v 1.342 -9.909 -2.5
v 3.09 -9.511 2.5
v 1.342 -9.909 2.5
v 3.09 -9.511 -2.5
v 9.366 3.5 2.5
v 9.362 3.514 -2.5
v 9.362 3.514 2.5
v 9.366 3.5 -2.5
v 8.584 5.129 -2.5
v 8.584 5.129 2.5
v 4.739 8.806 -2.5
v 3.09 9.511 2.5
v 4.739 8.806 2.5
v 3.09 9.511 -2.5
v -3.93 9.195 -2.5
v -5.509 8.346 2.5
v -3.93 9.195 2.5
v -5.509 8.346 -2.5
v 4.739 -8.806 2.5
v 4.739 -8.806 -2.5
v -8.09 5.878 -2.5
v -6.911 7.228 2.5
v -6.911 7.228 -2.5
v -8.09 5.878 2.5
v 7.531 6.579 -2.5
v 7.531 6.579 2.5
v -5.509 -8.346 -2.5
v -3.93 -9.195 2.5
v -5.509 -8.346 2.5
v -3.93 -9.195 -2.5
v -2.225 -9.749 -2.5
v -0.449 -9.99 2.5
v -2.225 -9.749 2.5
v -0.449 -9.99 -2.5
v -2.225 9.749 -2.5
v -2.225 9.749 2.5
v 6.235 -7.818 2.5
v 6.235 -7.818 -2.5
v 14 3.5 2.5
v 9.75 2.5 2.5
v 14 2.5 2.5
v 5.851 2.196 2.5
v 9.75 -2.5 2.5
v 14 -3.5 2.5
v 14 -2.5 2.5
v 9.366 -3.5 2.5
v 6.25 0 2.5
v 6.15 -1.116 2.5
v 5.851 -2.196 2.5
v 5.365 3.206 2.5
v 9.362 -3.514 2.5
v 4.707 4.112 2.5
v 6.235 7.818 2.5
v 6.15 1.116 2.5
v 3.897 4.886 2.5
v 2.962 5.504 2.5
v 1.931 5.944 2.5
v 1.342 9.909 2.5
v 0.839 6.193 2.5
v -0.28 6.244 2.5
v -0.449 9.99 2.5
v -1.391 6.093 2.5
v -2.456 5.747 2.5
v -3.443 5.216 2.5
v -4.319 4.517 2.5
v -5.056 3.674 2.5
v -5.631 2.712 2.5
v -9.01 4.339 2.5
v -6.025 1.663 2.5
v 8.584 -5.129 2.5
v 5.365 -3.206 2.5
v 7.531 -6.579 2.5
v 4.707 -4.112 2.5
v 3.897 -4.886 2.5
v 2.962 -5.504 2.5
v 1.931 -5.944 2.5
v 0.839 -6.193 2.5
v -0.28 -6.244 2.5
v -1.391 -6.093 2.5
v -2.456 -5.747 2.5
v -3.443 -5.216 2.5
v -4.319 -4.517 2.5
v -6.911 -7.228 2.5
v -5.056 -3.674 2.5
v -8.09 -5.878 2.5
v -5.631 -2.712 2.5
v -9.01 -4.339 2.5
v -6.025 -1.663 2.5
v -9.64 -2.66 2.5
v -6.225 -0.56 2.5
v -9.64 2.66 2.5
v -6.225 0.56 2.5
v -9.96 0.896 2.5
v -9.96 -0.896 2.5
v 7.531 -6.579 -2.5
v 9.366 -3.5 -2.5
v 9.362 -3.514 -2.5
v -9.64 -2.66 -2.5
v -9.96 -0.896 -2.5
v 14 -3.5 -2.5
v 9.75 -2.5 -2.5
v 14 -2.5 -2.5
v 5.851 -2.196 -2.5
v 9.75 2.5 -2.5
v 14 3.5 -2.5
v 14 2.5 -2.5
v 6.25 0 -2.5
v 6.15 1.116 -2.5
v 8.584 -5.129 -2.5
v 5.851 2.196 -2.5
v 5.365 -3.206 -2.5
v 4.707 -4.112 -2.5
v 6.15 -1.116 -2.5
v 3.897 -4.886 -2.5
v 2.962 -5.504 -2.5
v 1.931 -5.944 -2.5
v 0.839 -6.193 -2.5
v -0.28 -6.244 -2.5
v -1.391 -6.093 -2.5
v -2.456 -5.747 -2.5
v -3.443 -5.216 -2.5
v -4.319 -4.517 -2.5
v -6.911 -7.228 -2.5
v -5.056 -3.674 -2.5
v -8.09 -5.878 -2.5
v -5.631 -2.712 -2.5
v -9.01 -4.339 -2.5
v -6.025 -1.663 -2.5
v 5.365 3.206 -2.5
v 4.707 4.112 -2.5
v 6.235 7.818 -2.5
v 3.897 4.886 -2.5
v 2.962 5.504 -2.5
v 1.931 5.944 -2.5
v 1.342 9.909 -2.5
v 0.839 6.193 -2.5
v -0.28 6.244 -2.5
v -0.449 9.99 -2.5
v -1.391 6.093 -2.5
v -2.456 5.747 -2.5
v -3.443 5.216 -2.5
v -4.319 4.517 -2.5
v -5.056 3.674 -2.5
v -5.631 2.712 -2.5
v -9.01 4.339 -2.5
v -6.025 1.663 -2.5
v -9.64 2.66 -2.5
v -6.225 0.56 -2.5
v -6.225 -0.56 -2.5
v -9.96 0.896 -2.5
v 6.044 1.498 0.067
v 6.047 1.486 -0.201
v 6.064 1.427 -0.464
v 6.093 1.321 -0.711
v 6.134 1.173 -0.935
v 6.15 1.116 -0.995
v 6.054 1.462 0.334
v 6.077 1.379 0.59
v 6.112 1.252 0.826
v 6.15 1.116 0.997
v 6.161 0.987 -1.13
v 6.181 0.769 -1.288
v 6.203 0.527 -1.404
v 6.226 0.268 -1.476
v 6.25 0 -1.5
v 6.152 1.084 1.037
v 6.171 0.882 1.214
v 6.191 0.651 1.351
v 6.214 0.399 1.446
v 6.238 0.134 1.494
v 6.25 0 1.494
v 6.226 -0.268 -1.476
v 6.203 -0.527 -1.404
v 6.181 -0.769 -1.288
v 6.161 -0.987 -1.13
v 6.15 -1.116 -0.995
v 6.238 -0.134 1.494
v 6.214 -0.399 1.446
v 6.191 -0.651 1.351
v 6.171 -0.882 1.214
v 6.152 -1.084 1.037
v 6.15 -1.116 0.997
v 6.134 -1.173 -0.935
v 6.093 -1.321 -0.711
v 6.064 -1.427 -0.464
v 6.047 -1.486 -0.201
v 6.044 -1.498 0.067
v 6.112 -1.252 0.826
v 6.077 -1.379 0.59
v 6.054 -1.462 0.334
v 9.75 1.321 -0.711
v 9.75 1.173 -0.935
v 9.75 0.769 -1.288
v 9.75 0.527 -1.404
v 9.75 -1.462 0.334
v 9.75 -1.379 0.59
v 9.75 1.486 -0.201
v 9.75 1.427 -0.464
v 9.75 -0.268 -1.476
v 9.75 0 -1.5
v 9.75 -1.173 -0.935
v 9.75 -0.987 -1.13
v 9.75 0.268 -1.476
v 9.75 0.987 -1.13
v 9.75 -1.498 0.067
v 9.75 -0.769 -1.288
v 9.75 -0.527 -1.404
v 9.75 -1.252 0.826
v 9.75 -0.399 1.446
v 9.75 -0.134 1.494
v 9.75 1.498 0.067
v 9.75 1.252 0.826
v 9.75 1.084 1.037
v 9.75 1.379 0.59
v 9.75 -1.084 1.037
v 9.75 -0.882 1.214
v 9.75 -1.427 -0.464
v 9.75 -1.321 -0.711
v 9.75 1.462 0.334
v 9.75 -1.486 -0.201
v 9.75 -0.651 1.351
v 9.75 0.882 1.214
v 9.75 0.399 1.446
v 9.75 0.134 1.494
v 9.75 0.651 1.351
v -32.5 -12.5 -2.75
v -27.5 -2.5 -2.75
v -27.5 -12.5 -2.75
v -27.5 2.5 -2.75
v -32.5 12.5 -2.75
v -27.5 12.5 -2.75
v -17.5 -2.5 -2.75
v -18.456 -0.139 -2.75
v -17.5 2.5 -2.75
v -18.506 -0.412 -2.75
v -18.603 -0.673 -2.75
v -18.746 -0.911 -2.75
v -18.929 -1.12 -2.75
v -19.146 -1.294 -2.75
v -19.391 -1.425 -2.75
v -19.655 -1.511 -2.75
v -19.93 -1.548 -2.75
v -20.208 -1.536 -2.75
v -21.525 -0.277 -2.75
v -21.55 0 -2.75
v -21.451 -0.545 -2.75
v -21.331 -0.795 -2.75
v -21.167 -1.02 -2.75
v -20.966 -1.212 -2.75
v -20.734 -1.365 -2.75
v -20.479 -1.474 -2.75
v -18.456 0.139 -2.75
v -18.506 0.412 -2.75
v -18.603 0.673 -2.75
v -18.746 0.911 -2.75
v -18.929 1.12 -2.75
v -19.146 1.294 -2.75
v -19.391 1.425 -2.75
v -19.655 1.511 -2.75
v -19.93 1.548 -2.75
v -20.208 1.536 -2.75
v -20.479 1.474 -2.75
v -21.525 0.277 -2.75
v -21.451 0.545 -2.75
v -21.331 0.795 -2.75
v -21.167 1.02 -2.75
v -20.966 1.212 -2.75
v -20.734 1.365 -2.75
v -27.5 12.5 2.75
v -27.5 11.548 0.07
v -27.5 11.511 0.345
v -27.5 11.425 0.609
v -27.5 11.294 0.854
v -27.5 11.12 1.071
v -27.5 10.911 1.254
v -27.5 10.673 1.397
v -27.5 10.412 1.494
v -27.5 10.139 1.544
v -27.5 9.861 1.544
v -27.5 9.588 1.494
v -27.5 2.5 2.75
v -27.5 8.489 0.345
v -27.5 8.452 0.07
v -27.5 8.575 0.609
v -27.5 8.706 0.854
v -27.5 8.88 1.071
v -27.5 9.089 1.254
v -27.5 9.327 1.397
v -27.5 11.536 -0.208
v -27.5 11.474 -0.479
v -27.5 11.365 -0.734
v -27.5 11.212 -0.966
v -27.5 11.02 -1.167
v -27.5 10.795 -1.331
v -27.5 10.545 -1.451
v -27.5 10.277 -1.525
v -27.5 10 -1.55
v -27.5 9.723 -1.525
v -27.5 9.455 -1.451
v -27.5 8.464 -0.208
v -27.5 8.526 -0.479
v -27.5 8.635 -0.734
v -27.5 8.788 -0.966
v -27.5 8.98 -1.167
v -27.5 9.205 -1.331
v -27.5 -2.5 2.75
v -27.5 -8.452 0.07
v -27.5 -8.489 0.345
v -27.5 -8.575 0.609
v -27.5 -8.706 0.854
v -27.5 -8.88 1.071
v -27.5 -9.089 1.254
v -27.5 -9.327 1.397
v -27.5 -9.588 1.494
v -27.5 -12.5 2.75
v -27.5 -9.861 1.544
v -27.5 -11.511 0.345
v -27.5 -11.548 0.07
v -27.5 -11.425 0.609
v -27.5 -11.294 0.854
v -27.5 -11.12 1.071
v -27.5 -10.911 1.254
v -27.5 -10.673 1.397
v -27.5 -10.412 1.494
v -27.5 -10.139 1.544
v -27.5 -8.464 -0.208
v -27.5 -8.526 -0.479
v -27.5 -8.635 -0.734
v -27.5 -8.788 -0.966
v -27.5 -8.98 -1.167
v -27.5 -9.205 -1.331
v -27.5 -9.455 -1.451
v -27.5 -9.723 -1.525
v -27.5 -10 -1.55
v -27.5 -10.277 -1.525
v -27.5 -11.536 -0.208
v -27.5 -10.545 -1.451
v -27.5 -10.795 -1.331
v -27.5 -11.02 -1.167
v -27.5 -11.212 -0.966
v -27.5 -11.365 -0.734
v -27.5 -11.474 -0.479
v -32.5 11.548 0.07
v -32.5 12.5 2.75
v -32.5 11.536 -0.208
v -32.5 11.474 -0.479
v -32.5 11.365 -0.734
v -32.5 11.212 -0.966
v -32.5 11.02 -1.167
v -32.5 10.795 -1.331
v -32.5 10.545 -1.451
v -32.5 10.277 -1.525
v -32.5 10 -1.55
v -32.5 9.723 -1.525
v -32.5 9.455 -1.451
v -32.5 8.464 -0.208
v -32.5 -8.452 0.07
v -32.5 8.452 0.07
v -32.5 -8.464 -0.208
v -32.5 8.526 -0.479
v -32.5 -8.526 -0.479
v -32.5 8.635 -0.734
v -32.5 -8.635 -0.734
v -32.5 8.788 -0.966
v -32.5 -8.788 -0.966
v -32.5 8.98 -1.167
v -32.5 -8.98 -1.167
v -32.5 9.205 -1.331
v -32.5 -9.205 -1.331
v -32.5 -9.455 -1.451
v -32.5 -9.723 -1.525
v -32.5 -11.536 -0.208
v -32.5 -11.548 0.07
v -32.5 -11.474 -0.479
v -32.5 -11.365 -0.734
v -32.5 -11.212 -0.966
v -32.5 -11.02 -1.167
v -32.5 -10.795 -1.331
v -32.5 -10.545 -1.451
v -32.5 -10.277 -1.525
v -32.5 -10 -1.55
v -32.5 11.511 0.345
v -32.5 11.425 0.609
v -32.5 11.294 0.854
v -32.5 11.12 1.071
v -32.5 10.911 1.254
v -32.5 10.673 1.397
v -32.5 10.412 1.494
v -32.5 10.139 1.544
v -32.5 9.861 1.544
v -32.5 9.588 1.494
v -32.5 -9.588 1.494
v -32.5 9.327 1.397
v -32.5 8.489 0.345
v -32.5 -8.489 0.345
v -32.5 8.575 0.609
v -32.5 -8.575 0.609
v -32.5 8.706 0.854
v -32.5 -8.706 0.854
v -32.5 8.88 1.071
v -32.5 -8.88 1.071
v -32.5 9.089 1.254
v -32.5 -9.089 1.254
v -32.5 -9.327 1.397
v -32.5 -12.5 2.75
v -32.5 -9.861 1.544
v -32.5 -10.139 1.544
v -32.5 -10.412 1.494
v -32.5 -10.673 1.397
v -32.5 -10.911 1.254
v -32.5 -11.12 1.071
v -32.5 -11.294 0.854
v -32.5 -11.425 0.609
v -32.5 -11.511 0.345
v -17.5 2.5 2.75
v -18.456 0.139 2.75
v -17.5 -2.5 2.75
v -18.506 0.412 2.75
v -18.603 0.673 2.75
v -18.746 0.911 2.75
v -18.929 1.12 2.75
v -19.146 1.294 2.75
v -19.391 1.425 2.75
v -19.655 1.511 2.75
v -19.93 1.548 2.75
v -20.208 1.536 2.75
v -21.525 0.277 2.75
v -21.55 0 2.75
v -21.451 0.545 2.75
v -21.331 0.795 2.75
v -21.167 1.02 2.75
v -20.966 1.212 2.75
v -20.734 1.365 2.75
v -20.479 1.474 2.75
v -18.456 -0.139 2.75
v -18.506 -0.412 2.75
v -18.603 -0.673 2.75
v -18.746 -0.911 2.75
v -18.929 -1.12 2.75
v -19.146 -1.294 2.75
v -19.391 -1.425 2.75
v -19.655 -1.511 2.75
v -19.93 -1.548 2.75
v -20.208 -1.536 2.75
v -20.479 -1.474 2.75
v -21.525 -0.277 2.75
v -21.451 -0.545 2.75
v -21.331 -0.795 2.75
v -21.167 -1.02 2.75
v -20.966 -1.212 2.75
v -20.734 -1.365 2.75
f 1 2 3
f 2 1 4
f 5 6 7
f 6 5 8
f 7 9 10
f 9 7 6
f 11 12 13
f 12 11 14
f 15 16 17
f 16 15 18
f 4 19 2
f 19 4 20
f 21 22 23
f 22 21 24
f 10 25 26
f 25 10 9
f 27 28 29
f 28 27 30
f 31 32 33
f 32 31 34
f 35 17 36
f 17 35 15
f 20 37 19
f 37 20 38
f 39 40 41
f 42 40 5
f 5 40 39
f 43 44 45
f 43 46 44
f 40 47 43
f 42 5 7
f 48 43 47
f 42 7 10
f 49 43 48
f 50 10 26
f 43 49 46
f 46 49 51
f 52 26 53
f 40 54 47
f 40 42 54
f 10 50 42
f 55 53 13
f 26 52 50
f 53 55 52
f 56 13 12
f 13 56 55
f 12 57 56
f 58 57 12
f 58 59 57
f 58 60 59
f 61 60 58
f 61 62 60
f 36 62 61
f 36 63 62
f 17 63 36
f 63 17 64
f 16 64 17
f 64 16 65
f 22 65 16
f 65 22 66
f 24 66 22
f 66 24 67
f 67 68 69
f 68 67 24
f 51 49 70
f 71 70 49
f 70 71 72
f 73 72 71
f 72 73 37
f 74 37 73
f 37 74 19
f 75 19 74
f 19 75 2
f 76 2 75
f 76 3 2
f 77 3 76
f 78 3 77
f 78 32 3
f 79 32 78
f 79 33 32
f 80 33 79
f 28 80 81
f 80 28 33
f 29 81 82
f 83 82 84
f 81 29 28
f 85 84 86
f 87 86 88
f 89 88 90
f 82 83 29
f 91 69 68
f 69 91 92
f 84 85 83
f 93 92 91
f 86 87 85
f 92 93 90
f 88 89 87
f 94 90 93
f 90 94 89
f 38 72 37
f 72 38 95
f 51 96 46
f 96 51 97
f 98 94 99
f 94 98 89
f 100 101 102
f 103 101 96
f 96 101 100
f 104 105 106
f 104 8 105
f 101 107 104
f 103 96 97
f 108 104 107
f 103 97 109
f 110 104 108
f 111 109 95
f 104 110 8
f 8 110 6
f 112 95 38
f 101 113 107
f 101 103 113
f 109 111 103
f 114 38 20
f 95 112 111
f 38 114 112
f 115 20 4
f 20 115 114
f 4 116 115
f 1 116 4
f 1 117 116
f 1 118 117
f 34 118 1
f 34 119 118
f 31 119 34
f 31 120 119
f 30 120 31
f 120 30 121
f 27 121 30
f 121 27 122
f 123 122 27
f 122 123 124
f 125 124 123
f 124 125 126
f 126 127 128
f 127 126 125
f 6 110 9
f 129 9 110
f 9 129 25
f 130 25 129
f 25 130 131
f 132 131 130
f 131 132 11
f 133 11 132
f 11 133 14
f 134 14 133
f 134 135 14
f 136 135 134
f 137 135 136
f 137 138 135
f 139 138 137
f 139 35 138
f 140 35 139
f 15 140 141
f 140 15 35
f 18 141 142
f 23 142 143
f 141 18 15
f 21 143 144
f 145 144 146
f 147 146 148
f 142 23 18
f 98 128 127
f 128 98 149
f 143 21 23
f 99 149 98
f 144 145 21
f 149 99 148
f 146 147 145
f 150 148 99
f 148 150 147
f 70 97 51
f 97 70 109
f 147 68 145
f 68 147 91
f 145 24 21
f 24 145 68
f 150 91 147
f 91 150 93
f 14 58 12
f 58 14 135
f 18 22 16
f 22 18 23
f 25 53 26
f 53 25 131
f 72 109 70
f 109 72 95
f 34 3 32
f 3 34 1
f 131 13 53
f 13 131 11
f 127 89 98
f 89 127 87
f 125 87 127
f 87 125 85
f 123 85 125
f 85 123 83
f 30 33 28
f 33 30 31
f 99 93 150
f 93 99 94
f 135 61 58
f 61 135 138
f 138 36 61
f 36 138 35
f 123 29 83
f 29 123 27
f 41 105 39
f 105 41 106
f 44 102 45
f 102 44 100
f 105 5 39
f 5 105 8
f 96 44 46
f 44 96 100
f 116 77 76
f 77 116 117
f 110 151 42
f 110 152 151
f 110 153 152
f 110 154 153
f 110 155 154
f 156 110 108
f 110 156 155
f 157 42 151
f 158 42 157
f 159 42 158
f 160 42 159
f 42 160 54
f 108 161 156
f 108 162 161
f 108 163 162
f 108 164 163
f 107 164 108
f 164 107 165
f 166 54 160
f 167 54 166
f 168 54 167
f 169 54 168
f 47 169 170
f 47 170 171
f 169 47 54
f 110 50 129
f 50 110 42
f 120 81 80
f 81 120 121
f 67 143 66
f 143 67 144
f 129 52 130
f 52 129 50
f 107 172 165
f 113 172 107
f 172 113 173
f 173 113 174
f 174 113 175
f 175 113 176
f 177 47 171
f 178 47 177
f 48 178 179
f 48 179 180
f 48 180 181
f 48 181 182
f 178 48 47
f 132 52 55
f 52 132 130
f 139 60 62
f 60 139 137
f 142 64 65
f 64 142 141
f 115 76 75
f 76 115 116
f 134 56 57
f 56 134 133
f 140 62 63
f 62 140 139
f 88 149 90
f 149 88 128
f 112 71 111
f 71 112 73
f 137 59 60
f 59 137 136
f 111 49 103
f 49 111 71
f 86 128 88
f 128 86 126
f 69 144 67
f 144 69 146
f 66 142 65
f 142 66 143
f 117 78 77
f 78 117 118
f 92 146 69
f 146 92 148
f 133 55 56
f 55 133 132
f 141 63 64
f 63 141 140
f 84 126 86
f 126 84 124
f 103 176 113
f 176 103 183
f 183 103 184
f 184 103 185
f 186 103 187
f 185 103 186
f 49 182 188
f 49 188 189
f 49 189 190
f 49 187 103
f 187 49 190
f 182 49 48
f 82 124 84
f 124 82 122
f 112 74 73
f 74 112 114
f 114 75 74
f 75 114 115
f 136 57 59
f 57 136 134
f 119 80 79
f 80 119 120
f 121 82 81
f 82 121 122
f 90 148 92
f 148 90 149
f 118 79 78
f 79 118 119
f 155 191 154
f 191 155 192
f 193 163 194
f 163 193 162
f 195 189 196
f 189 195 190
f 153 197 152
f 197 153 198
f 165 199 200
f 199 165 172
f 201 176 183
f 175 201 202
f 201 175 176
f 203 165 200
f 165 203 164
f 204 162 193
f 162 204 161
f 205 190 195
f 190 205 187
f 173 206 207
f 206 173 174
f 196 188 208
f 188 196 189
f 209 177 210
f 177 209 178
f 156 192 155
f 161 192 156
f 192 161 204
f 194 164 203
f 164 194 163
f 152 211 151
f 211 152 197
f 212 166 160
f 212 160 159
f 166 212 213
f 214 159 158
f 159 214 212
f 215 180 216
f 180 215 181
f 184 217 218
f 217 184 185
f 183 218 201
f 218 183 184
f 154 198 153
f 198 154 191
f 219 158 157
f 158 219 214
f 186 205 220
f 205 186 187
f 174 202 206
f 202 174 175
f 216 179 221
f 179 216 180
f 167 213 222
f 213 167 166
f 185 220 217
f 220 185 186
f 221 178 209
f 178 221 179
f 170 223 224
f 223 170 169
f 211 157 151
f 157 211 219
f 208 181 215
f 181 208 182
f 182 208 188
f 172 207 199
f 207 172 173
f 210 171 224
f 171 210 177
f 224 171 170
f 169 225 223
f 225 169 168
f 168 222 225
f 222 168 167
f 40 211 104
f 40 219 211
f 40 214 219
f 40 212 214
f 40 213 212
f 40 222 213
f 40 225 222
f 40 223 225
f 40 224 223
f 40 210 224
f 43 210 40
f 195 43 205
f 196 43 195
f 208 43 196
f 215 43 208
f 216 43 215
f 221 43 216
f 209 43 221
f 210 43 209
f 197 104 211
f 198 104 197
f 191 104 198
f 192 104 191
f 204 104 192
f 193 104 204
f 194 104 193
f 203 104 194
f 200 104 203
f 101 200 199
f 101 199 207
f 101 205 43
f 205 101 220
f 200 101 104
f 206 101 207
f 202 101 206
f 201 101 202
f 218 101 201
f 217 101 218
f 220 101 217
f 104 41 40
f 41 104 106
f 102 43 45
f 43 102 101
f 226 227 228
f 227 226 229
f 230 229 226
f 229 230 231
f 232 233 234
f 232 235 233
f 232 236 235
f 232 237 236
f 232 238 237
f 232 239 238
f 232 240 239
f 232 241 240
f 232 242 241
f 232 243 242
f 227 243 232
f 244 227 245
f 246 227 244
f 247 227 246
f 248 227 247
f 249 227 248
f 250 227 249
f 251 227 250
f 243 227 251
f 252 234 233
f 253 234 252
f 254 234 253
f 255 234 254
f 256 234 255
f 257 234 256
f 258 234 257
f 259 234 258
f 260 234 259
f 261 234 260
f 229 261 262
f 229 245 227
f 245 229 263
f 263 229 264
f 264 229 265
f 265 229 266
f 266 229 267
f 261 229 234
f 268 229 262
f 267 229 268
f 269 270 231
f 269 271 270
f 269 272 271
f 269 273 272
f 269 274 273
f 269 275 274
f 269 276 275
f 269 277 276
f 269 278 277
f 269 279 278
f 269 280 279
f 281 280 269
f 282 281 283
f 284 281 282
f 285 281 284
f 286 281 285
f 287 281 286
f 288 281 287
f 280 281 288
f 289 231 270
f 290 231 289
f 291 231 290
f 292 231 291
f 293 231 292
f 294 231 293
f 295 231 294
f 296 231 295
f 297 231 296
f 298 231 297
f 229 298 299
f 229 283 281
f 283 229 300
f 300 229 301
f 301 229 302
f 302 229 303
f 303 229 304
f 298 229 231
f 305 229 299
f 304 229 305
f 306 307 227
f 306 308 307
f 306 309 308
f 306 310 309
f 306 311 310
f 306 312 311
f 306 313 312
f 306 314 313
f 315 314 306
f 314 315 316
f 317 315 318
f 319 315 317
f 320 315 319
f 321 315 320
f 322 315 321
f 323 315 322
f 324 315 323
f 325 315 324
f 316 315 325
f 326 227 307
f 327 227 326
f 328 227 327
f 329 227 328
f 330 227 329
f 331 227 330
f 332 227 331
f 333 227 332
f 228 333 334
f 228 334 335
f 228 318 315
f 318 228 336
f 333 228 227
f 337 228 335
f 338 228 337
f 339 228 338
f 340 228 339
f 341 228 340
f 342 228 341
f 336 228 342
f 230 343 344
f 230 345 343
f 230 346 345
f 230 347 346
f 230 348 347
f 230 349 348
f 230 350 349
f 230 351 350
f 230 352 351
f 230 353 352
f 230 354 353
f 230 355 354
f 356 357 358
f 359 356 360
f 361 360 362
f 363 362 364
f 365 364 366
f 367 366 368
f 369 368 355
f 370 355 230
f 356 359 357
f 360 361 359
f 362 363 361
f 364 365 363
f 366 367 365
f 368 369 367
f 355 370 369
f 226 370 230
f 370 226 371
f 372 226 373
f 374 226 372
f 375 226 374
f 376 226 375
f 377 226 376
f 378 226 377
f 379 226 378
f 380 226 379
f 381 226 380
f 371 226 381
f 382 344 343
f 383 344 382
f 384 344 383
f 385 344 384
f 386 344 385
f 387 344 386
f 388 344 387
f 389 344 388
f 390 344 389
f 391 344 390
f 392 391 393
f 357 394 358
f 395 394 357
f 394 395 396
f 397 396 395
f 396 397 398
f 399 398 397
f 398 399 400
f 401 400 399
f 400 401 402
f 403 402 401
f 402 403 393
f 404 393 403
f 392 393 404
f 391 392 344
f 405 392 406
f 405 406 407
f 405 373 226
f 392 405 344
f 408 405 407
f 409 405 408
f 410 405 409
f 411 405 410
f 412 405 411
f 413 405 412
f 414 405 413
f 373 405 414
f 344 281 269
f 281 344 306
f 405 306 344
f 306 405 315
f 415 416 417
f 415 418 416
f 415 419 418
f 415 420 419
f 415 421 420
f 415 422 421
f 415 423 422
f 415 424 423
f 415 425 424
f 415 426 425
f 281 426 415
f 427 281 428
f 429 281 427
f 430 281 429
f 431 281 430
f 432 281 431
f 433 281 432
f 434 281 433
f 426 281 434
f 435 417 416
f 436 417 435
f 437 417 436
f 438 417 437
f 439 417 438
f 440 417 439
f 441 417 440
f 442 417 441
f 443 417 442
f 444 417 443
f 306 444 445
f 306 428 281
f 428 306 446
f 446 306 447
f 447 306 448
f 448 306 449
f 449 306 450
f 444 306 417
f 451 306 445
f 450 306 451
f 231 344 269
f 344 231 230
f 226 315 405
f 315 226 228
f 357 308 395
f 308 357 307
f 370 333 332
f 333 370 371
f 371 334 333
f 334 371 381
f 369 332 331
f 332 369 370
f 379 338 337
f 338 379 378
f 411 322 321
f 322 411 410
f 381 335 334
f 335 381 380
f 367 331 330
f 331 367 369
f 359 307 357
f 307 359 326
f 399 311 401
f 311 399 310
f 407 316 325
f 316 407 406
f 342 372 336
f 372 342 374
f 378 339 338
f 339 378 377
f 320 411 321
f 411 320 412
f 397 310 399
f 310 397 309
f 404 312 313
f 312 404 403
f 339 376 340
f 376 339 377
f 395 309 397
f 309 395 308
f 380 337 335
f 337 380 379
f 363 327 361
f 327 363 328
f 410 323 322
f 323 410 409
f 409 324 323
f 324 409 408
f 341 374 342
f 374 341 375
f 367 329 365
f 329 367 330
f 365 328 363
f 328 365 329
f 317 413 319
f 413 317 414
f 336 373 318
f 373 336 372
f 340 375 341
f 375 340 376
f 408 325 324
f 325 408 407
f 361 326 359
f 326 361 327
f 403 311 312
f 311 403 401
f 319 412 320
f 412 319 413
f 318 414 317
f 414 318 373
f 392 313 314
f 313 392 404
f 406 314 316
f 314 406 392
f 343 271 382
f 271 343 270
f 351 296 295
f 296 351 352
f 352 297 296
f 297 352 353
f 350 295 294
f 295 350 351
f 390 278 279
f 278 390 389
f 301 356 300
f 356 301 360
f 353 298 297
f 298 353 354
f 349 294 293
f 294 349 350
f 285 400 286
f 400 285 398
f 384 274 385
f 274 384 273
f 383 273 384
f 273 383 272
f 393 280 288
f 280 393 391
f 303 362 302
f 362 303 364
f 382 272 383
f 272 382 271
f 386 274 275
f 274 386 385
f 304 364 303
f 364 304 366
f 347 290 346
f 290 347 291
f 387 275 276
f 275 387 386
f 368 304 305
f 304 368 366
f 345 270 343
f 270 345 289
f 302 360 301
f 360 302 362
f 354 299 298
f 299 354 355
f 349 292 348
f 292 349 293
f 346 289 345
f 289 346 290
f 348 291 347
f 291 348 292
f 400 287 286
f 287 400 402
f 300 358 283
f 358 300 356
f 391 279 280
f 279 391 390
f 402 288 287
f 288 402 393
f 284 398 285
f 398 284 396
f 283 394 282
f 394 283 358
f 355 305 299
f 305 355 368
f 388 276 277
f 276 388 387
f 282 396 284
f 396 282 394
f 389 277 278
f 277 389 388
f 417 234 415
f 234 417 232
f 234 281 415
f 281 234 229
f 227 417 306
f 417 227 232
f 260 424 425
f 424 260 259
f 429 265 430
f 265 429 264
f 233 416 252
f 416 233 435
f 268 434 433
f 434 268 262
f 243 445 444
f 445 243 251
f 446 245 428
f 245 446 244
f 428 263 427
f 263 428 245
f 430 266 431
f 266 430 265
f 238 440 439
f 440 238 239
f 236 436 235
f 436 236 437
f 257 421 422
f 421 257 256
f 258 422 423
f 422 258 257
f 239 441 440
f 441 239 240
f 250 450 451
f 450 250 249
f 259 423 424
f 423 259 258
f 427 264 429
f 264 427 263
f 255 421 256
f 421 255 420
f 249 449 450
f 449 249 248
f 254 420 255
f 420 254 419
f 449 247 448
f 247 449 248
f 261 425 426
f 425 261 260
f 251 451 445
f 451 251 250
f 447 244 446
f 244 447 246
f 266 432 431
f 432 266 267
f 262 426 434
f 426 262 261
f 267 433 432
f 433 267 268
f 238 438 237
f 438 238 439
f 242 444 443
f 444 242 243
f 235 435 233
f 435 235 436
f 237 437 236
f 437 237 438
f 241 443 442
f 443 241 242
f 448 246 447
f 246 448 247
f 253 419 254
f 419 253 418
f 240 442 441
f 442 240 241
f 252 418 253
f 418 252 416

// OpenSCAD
// file: constants.scad
nemaoffset=15;
nemaholedistance=31;
nemahole=22.8;
$fn=35;
m3=3;
zRodSpread=80;
m3borehole=2.7;
lmu8width=15.4;
lmu8len=24;
bearingthickness=8;
bearingod=10;
beltthickness=1.4;
beltwidth=6;
608width=22;
608thick=7;
608hole=8;
rodHole=8.2;
extrusion=15;
extrusionFudge=.3;
extrusionLength=400;
wall=5;
pulleyWidth=608width+beltthickness*3+10;
pulleyHeight=lmu8width+wall;
gt2pulleydia=10;
m8washerthickness=1.6;
yslideWidth=lmu8width+wall;
yBlockLen=lmu8len*3+wall;
xRodSpread=yBlockLen-wall*4;
xCarriageWidth=xRodSpread+wall+lmu8width+2*wall;
xCarriageLength=lmu8len*2.2;
hotendMount=16.3;
hotendMountHeight=3.7;
// main file
include <constants.scad>

module tab() {
  difference() {
    cube([5.5,25,5], center=true);
    translate([0,-10,0]) cylinder(d=3.1, h=6, center=true);
    translate([0,10,0]) cylinder(d=3.1, h=6, center=true);
  }
  difference() {
  translate([0,0,7.5]) cube([5.5,5,10], center=true);
    translate([0, 0, 10]) rotate([0,90,0]) cylinder(d=3.1, h=10, center=true);
}
}

module sensorMount() {
 difference() {
   union() {
  cylinder(d=20, h=5, center=true);
  translate([20/2, 0, 0]) cube([8, 7, 5], center=true);
  }
  union() {
  cylinder(d=12.5, h=5.1, center=true);
  translate([10,0,0])  rotate([0,90,0]) cylinder(d=3, h=20, center=true);

translate([20/2+2.5,0,0])
  cube([5.5, 5, 10], center=true);
}
 }



}

sensorMount();
translate([-30, 0, 0]) rotate([0,90,0])  tab();
